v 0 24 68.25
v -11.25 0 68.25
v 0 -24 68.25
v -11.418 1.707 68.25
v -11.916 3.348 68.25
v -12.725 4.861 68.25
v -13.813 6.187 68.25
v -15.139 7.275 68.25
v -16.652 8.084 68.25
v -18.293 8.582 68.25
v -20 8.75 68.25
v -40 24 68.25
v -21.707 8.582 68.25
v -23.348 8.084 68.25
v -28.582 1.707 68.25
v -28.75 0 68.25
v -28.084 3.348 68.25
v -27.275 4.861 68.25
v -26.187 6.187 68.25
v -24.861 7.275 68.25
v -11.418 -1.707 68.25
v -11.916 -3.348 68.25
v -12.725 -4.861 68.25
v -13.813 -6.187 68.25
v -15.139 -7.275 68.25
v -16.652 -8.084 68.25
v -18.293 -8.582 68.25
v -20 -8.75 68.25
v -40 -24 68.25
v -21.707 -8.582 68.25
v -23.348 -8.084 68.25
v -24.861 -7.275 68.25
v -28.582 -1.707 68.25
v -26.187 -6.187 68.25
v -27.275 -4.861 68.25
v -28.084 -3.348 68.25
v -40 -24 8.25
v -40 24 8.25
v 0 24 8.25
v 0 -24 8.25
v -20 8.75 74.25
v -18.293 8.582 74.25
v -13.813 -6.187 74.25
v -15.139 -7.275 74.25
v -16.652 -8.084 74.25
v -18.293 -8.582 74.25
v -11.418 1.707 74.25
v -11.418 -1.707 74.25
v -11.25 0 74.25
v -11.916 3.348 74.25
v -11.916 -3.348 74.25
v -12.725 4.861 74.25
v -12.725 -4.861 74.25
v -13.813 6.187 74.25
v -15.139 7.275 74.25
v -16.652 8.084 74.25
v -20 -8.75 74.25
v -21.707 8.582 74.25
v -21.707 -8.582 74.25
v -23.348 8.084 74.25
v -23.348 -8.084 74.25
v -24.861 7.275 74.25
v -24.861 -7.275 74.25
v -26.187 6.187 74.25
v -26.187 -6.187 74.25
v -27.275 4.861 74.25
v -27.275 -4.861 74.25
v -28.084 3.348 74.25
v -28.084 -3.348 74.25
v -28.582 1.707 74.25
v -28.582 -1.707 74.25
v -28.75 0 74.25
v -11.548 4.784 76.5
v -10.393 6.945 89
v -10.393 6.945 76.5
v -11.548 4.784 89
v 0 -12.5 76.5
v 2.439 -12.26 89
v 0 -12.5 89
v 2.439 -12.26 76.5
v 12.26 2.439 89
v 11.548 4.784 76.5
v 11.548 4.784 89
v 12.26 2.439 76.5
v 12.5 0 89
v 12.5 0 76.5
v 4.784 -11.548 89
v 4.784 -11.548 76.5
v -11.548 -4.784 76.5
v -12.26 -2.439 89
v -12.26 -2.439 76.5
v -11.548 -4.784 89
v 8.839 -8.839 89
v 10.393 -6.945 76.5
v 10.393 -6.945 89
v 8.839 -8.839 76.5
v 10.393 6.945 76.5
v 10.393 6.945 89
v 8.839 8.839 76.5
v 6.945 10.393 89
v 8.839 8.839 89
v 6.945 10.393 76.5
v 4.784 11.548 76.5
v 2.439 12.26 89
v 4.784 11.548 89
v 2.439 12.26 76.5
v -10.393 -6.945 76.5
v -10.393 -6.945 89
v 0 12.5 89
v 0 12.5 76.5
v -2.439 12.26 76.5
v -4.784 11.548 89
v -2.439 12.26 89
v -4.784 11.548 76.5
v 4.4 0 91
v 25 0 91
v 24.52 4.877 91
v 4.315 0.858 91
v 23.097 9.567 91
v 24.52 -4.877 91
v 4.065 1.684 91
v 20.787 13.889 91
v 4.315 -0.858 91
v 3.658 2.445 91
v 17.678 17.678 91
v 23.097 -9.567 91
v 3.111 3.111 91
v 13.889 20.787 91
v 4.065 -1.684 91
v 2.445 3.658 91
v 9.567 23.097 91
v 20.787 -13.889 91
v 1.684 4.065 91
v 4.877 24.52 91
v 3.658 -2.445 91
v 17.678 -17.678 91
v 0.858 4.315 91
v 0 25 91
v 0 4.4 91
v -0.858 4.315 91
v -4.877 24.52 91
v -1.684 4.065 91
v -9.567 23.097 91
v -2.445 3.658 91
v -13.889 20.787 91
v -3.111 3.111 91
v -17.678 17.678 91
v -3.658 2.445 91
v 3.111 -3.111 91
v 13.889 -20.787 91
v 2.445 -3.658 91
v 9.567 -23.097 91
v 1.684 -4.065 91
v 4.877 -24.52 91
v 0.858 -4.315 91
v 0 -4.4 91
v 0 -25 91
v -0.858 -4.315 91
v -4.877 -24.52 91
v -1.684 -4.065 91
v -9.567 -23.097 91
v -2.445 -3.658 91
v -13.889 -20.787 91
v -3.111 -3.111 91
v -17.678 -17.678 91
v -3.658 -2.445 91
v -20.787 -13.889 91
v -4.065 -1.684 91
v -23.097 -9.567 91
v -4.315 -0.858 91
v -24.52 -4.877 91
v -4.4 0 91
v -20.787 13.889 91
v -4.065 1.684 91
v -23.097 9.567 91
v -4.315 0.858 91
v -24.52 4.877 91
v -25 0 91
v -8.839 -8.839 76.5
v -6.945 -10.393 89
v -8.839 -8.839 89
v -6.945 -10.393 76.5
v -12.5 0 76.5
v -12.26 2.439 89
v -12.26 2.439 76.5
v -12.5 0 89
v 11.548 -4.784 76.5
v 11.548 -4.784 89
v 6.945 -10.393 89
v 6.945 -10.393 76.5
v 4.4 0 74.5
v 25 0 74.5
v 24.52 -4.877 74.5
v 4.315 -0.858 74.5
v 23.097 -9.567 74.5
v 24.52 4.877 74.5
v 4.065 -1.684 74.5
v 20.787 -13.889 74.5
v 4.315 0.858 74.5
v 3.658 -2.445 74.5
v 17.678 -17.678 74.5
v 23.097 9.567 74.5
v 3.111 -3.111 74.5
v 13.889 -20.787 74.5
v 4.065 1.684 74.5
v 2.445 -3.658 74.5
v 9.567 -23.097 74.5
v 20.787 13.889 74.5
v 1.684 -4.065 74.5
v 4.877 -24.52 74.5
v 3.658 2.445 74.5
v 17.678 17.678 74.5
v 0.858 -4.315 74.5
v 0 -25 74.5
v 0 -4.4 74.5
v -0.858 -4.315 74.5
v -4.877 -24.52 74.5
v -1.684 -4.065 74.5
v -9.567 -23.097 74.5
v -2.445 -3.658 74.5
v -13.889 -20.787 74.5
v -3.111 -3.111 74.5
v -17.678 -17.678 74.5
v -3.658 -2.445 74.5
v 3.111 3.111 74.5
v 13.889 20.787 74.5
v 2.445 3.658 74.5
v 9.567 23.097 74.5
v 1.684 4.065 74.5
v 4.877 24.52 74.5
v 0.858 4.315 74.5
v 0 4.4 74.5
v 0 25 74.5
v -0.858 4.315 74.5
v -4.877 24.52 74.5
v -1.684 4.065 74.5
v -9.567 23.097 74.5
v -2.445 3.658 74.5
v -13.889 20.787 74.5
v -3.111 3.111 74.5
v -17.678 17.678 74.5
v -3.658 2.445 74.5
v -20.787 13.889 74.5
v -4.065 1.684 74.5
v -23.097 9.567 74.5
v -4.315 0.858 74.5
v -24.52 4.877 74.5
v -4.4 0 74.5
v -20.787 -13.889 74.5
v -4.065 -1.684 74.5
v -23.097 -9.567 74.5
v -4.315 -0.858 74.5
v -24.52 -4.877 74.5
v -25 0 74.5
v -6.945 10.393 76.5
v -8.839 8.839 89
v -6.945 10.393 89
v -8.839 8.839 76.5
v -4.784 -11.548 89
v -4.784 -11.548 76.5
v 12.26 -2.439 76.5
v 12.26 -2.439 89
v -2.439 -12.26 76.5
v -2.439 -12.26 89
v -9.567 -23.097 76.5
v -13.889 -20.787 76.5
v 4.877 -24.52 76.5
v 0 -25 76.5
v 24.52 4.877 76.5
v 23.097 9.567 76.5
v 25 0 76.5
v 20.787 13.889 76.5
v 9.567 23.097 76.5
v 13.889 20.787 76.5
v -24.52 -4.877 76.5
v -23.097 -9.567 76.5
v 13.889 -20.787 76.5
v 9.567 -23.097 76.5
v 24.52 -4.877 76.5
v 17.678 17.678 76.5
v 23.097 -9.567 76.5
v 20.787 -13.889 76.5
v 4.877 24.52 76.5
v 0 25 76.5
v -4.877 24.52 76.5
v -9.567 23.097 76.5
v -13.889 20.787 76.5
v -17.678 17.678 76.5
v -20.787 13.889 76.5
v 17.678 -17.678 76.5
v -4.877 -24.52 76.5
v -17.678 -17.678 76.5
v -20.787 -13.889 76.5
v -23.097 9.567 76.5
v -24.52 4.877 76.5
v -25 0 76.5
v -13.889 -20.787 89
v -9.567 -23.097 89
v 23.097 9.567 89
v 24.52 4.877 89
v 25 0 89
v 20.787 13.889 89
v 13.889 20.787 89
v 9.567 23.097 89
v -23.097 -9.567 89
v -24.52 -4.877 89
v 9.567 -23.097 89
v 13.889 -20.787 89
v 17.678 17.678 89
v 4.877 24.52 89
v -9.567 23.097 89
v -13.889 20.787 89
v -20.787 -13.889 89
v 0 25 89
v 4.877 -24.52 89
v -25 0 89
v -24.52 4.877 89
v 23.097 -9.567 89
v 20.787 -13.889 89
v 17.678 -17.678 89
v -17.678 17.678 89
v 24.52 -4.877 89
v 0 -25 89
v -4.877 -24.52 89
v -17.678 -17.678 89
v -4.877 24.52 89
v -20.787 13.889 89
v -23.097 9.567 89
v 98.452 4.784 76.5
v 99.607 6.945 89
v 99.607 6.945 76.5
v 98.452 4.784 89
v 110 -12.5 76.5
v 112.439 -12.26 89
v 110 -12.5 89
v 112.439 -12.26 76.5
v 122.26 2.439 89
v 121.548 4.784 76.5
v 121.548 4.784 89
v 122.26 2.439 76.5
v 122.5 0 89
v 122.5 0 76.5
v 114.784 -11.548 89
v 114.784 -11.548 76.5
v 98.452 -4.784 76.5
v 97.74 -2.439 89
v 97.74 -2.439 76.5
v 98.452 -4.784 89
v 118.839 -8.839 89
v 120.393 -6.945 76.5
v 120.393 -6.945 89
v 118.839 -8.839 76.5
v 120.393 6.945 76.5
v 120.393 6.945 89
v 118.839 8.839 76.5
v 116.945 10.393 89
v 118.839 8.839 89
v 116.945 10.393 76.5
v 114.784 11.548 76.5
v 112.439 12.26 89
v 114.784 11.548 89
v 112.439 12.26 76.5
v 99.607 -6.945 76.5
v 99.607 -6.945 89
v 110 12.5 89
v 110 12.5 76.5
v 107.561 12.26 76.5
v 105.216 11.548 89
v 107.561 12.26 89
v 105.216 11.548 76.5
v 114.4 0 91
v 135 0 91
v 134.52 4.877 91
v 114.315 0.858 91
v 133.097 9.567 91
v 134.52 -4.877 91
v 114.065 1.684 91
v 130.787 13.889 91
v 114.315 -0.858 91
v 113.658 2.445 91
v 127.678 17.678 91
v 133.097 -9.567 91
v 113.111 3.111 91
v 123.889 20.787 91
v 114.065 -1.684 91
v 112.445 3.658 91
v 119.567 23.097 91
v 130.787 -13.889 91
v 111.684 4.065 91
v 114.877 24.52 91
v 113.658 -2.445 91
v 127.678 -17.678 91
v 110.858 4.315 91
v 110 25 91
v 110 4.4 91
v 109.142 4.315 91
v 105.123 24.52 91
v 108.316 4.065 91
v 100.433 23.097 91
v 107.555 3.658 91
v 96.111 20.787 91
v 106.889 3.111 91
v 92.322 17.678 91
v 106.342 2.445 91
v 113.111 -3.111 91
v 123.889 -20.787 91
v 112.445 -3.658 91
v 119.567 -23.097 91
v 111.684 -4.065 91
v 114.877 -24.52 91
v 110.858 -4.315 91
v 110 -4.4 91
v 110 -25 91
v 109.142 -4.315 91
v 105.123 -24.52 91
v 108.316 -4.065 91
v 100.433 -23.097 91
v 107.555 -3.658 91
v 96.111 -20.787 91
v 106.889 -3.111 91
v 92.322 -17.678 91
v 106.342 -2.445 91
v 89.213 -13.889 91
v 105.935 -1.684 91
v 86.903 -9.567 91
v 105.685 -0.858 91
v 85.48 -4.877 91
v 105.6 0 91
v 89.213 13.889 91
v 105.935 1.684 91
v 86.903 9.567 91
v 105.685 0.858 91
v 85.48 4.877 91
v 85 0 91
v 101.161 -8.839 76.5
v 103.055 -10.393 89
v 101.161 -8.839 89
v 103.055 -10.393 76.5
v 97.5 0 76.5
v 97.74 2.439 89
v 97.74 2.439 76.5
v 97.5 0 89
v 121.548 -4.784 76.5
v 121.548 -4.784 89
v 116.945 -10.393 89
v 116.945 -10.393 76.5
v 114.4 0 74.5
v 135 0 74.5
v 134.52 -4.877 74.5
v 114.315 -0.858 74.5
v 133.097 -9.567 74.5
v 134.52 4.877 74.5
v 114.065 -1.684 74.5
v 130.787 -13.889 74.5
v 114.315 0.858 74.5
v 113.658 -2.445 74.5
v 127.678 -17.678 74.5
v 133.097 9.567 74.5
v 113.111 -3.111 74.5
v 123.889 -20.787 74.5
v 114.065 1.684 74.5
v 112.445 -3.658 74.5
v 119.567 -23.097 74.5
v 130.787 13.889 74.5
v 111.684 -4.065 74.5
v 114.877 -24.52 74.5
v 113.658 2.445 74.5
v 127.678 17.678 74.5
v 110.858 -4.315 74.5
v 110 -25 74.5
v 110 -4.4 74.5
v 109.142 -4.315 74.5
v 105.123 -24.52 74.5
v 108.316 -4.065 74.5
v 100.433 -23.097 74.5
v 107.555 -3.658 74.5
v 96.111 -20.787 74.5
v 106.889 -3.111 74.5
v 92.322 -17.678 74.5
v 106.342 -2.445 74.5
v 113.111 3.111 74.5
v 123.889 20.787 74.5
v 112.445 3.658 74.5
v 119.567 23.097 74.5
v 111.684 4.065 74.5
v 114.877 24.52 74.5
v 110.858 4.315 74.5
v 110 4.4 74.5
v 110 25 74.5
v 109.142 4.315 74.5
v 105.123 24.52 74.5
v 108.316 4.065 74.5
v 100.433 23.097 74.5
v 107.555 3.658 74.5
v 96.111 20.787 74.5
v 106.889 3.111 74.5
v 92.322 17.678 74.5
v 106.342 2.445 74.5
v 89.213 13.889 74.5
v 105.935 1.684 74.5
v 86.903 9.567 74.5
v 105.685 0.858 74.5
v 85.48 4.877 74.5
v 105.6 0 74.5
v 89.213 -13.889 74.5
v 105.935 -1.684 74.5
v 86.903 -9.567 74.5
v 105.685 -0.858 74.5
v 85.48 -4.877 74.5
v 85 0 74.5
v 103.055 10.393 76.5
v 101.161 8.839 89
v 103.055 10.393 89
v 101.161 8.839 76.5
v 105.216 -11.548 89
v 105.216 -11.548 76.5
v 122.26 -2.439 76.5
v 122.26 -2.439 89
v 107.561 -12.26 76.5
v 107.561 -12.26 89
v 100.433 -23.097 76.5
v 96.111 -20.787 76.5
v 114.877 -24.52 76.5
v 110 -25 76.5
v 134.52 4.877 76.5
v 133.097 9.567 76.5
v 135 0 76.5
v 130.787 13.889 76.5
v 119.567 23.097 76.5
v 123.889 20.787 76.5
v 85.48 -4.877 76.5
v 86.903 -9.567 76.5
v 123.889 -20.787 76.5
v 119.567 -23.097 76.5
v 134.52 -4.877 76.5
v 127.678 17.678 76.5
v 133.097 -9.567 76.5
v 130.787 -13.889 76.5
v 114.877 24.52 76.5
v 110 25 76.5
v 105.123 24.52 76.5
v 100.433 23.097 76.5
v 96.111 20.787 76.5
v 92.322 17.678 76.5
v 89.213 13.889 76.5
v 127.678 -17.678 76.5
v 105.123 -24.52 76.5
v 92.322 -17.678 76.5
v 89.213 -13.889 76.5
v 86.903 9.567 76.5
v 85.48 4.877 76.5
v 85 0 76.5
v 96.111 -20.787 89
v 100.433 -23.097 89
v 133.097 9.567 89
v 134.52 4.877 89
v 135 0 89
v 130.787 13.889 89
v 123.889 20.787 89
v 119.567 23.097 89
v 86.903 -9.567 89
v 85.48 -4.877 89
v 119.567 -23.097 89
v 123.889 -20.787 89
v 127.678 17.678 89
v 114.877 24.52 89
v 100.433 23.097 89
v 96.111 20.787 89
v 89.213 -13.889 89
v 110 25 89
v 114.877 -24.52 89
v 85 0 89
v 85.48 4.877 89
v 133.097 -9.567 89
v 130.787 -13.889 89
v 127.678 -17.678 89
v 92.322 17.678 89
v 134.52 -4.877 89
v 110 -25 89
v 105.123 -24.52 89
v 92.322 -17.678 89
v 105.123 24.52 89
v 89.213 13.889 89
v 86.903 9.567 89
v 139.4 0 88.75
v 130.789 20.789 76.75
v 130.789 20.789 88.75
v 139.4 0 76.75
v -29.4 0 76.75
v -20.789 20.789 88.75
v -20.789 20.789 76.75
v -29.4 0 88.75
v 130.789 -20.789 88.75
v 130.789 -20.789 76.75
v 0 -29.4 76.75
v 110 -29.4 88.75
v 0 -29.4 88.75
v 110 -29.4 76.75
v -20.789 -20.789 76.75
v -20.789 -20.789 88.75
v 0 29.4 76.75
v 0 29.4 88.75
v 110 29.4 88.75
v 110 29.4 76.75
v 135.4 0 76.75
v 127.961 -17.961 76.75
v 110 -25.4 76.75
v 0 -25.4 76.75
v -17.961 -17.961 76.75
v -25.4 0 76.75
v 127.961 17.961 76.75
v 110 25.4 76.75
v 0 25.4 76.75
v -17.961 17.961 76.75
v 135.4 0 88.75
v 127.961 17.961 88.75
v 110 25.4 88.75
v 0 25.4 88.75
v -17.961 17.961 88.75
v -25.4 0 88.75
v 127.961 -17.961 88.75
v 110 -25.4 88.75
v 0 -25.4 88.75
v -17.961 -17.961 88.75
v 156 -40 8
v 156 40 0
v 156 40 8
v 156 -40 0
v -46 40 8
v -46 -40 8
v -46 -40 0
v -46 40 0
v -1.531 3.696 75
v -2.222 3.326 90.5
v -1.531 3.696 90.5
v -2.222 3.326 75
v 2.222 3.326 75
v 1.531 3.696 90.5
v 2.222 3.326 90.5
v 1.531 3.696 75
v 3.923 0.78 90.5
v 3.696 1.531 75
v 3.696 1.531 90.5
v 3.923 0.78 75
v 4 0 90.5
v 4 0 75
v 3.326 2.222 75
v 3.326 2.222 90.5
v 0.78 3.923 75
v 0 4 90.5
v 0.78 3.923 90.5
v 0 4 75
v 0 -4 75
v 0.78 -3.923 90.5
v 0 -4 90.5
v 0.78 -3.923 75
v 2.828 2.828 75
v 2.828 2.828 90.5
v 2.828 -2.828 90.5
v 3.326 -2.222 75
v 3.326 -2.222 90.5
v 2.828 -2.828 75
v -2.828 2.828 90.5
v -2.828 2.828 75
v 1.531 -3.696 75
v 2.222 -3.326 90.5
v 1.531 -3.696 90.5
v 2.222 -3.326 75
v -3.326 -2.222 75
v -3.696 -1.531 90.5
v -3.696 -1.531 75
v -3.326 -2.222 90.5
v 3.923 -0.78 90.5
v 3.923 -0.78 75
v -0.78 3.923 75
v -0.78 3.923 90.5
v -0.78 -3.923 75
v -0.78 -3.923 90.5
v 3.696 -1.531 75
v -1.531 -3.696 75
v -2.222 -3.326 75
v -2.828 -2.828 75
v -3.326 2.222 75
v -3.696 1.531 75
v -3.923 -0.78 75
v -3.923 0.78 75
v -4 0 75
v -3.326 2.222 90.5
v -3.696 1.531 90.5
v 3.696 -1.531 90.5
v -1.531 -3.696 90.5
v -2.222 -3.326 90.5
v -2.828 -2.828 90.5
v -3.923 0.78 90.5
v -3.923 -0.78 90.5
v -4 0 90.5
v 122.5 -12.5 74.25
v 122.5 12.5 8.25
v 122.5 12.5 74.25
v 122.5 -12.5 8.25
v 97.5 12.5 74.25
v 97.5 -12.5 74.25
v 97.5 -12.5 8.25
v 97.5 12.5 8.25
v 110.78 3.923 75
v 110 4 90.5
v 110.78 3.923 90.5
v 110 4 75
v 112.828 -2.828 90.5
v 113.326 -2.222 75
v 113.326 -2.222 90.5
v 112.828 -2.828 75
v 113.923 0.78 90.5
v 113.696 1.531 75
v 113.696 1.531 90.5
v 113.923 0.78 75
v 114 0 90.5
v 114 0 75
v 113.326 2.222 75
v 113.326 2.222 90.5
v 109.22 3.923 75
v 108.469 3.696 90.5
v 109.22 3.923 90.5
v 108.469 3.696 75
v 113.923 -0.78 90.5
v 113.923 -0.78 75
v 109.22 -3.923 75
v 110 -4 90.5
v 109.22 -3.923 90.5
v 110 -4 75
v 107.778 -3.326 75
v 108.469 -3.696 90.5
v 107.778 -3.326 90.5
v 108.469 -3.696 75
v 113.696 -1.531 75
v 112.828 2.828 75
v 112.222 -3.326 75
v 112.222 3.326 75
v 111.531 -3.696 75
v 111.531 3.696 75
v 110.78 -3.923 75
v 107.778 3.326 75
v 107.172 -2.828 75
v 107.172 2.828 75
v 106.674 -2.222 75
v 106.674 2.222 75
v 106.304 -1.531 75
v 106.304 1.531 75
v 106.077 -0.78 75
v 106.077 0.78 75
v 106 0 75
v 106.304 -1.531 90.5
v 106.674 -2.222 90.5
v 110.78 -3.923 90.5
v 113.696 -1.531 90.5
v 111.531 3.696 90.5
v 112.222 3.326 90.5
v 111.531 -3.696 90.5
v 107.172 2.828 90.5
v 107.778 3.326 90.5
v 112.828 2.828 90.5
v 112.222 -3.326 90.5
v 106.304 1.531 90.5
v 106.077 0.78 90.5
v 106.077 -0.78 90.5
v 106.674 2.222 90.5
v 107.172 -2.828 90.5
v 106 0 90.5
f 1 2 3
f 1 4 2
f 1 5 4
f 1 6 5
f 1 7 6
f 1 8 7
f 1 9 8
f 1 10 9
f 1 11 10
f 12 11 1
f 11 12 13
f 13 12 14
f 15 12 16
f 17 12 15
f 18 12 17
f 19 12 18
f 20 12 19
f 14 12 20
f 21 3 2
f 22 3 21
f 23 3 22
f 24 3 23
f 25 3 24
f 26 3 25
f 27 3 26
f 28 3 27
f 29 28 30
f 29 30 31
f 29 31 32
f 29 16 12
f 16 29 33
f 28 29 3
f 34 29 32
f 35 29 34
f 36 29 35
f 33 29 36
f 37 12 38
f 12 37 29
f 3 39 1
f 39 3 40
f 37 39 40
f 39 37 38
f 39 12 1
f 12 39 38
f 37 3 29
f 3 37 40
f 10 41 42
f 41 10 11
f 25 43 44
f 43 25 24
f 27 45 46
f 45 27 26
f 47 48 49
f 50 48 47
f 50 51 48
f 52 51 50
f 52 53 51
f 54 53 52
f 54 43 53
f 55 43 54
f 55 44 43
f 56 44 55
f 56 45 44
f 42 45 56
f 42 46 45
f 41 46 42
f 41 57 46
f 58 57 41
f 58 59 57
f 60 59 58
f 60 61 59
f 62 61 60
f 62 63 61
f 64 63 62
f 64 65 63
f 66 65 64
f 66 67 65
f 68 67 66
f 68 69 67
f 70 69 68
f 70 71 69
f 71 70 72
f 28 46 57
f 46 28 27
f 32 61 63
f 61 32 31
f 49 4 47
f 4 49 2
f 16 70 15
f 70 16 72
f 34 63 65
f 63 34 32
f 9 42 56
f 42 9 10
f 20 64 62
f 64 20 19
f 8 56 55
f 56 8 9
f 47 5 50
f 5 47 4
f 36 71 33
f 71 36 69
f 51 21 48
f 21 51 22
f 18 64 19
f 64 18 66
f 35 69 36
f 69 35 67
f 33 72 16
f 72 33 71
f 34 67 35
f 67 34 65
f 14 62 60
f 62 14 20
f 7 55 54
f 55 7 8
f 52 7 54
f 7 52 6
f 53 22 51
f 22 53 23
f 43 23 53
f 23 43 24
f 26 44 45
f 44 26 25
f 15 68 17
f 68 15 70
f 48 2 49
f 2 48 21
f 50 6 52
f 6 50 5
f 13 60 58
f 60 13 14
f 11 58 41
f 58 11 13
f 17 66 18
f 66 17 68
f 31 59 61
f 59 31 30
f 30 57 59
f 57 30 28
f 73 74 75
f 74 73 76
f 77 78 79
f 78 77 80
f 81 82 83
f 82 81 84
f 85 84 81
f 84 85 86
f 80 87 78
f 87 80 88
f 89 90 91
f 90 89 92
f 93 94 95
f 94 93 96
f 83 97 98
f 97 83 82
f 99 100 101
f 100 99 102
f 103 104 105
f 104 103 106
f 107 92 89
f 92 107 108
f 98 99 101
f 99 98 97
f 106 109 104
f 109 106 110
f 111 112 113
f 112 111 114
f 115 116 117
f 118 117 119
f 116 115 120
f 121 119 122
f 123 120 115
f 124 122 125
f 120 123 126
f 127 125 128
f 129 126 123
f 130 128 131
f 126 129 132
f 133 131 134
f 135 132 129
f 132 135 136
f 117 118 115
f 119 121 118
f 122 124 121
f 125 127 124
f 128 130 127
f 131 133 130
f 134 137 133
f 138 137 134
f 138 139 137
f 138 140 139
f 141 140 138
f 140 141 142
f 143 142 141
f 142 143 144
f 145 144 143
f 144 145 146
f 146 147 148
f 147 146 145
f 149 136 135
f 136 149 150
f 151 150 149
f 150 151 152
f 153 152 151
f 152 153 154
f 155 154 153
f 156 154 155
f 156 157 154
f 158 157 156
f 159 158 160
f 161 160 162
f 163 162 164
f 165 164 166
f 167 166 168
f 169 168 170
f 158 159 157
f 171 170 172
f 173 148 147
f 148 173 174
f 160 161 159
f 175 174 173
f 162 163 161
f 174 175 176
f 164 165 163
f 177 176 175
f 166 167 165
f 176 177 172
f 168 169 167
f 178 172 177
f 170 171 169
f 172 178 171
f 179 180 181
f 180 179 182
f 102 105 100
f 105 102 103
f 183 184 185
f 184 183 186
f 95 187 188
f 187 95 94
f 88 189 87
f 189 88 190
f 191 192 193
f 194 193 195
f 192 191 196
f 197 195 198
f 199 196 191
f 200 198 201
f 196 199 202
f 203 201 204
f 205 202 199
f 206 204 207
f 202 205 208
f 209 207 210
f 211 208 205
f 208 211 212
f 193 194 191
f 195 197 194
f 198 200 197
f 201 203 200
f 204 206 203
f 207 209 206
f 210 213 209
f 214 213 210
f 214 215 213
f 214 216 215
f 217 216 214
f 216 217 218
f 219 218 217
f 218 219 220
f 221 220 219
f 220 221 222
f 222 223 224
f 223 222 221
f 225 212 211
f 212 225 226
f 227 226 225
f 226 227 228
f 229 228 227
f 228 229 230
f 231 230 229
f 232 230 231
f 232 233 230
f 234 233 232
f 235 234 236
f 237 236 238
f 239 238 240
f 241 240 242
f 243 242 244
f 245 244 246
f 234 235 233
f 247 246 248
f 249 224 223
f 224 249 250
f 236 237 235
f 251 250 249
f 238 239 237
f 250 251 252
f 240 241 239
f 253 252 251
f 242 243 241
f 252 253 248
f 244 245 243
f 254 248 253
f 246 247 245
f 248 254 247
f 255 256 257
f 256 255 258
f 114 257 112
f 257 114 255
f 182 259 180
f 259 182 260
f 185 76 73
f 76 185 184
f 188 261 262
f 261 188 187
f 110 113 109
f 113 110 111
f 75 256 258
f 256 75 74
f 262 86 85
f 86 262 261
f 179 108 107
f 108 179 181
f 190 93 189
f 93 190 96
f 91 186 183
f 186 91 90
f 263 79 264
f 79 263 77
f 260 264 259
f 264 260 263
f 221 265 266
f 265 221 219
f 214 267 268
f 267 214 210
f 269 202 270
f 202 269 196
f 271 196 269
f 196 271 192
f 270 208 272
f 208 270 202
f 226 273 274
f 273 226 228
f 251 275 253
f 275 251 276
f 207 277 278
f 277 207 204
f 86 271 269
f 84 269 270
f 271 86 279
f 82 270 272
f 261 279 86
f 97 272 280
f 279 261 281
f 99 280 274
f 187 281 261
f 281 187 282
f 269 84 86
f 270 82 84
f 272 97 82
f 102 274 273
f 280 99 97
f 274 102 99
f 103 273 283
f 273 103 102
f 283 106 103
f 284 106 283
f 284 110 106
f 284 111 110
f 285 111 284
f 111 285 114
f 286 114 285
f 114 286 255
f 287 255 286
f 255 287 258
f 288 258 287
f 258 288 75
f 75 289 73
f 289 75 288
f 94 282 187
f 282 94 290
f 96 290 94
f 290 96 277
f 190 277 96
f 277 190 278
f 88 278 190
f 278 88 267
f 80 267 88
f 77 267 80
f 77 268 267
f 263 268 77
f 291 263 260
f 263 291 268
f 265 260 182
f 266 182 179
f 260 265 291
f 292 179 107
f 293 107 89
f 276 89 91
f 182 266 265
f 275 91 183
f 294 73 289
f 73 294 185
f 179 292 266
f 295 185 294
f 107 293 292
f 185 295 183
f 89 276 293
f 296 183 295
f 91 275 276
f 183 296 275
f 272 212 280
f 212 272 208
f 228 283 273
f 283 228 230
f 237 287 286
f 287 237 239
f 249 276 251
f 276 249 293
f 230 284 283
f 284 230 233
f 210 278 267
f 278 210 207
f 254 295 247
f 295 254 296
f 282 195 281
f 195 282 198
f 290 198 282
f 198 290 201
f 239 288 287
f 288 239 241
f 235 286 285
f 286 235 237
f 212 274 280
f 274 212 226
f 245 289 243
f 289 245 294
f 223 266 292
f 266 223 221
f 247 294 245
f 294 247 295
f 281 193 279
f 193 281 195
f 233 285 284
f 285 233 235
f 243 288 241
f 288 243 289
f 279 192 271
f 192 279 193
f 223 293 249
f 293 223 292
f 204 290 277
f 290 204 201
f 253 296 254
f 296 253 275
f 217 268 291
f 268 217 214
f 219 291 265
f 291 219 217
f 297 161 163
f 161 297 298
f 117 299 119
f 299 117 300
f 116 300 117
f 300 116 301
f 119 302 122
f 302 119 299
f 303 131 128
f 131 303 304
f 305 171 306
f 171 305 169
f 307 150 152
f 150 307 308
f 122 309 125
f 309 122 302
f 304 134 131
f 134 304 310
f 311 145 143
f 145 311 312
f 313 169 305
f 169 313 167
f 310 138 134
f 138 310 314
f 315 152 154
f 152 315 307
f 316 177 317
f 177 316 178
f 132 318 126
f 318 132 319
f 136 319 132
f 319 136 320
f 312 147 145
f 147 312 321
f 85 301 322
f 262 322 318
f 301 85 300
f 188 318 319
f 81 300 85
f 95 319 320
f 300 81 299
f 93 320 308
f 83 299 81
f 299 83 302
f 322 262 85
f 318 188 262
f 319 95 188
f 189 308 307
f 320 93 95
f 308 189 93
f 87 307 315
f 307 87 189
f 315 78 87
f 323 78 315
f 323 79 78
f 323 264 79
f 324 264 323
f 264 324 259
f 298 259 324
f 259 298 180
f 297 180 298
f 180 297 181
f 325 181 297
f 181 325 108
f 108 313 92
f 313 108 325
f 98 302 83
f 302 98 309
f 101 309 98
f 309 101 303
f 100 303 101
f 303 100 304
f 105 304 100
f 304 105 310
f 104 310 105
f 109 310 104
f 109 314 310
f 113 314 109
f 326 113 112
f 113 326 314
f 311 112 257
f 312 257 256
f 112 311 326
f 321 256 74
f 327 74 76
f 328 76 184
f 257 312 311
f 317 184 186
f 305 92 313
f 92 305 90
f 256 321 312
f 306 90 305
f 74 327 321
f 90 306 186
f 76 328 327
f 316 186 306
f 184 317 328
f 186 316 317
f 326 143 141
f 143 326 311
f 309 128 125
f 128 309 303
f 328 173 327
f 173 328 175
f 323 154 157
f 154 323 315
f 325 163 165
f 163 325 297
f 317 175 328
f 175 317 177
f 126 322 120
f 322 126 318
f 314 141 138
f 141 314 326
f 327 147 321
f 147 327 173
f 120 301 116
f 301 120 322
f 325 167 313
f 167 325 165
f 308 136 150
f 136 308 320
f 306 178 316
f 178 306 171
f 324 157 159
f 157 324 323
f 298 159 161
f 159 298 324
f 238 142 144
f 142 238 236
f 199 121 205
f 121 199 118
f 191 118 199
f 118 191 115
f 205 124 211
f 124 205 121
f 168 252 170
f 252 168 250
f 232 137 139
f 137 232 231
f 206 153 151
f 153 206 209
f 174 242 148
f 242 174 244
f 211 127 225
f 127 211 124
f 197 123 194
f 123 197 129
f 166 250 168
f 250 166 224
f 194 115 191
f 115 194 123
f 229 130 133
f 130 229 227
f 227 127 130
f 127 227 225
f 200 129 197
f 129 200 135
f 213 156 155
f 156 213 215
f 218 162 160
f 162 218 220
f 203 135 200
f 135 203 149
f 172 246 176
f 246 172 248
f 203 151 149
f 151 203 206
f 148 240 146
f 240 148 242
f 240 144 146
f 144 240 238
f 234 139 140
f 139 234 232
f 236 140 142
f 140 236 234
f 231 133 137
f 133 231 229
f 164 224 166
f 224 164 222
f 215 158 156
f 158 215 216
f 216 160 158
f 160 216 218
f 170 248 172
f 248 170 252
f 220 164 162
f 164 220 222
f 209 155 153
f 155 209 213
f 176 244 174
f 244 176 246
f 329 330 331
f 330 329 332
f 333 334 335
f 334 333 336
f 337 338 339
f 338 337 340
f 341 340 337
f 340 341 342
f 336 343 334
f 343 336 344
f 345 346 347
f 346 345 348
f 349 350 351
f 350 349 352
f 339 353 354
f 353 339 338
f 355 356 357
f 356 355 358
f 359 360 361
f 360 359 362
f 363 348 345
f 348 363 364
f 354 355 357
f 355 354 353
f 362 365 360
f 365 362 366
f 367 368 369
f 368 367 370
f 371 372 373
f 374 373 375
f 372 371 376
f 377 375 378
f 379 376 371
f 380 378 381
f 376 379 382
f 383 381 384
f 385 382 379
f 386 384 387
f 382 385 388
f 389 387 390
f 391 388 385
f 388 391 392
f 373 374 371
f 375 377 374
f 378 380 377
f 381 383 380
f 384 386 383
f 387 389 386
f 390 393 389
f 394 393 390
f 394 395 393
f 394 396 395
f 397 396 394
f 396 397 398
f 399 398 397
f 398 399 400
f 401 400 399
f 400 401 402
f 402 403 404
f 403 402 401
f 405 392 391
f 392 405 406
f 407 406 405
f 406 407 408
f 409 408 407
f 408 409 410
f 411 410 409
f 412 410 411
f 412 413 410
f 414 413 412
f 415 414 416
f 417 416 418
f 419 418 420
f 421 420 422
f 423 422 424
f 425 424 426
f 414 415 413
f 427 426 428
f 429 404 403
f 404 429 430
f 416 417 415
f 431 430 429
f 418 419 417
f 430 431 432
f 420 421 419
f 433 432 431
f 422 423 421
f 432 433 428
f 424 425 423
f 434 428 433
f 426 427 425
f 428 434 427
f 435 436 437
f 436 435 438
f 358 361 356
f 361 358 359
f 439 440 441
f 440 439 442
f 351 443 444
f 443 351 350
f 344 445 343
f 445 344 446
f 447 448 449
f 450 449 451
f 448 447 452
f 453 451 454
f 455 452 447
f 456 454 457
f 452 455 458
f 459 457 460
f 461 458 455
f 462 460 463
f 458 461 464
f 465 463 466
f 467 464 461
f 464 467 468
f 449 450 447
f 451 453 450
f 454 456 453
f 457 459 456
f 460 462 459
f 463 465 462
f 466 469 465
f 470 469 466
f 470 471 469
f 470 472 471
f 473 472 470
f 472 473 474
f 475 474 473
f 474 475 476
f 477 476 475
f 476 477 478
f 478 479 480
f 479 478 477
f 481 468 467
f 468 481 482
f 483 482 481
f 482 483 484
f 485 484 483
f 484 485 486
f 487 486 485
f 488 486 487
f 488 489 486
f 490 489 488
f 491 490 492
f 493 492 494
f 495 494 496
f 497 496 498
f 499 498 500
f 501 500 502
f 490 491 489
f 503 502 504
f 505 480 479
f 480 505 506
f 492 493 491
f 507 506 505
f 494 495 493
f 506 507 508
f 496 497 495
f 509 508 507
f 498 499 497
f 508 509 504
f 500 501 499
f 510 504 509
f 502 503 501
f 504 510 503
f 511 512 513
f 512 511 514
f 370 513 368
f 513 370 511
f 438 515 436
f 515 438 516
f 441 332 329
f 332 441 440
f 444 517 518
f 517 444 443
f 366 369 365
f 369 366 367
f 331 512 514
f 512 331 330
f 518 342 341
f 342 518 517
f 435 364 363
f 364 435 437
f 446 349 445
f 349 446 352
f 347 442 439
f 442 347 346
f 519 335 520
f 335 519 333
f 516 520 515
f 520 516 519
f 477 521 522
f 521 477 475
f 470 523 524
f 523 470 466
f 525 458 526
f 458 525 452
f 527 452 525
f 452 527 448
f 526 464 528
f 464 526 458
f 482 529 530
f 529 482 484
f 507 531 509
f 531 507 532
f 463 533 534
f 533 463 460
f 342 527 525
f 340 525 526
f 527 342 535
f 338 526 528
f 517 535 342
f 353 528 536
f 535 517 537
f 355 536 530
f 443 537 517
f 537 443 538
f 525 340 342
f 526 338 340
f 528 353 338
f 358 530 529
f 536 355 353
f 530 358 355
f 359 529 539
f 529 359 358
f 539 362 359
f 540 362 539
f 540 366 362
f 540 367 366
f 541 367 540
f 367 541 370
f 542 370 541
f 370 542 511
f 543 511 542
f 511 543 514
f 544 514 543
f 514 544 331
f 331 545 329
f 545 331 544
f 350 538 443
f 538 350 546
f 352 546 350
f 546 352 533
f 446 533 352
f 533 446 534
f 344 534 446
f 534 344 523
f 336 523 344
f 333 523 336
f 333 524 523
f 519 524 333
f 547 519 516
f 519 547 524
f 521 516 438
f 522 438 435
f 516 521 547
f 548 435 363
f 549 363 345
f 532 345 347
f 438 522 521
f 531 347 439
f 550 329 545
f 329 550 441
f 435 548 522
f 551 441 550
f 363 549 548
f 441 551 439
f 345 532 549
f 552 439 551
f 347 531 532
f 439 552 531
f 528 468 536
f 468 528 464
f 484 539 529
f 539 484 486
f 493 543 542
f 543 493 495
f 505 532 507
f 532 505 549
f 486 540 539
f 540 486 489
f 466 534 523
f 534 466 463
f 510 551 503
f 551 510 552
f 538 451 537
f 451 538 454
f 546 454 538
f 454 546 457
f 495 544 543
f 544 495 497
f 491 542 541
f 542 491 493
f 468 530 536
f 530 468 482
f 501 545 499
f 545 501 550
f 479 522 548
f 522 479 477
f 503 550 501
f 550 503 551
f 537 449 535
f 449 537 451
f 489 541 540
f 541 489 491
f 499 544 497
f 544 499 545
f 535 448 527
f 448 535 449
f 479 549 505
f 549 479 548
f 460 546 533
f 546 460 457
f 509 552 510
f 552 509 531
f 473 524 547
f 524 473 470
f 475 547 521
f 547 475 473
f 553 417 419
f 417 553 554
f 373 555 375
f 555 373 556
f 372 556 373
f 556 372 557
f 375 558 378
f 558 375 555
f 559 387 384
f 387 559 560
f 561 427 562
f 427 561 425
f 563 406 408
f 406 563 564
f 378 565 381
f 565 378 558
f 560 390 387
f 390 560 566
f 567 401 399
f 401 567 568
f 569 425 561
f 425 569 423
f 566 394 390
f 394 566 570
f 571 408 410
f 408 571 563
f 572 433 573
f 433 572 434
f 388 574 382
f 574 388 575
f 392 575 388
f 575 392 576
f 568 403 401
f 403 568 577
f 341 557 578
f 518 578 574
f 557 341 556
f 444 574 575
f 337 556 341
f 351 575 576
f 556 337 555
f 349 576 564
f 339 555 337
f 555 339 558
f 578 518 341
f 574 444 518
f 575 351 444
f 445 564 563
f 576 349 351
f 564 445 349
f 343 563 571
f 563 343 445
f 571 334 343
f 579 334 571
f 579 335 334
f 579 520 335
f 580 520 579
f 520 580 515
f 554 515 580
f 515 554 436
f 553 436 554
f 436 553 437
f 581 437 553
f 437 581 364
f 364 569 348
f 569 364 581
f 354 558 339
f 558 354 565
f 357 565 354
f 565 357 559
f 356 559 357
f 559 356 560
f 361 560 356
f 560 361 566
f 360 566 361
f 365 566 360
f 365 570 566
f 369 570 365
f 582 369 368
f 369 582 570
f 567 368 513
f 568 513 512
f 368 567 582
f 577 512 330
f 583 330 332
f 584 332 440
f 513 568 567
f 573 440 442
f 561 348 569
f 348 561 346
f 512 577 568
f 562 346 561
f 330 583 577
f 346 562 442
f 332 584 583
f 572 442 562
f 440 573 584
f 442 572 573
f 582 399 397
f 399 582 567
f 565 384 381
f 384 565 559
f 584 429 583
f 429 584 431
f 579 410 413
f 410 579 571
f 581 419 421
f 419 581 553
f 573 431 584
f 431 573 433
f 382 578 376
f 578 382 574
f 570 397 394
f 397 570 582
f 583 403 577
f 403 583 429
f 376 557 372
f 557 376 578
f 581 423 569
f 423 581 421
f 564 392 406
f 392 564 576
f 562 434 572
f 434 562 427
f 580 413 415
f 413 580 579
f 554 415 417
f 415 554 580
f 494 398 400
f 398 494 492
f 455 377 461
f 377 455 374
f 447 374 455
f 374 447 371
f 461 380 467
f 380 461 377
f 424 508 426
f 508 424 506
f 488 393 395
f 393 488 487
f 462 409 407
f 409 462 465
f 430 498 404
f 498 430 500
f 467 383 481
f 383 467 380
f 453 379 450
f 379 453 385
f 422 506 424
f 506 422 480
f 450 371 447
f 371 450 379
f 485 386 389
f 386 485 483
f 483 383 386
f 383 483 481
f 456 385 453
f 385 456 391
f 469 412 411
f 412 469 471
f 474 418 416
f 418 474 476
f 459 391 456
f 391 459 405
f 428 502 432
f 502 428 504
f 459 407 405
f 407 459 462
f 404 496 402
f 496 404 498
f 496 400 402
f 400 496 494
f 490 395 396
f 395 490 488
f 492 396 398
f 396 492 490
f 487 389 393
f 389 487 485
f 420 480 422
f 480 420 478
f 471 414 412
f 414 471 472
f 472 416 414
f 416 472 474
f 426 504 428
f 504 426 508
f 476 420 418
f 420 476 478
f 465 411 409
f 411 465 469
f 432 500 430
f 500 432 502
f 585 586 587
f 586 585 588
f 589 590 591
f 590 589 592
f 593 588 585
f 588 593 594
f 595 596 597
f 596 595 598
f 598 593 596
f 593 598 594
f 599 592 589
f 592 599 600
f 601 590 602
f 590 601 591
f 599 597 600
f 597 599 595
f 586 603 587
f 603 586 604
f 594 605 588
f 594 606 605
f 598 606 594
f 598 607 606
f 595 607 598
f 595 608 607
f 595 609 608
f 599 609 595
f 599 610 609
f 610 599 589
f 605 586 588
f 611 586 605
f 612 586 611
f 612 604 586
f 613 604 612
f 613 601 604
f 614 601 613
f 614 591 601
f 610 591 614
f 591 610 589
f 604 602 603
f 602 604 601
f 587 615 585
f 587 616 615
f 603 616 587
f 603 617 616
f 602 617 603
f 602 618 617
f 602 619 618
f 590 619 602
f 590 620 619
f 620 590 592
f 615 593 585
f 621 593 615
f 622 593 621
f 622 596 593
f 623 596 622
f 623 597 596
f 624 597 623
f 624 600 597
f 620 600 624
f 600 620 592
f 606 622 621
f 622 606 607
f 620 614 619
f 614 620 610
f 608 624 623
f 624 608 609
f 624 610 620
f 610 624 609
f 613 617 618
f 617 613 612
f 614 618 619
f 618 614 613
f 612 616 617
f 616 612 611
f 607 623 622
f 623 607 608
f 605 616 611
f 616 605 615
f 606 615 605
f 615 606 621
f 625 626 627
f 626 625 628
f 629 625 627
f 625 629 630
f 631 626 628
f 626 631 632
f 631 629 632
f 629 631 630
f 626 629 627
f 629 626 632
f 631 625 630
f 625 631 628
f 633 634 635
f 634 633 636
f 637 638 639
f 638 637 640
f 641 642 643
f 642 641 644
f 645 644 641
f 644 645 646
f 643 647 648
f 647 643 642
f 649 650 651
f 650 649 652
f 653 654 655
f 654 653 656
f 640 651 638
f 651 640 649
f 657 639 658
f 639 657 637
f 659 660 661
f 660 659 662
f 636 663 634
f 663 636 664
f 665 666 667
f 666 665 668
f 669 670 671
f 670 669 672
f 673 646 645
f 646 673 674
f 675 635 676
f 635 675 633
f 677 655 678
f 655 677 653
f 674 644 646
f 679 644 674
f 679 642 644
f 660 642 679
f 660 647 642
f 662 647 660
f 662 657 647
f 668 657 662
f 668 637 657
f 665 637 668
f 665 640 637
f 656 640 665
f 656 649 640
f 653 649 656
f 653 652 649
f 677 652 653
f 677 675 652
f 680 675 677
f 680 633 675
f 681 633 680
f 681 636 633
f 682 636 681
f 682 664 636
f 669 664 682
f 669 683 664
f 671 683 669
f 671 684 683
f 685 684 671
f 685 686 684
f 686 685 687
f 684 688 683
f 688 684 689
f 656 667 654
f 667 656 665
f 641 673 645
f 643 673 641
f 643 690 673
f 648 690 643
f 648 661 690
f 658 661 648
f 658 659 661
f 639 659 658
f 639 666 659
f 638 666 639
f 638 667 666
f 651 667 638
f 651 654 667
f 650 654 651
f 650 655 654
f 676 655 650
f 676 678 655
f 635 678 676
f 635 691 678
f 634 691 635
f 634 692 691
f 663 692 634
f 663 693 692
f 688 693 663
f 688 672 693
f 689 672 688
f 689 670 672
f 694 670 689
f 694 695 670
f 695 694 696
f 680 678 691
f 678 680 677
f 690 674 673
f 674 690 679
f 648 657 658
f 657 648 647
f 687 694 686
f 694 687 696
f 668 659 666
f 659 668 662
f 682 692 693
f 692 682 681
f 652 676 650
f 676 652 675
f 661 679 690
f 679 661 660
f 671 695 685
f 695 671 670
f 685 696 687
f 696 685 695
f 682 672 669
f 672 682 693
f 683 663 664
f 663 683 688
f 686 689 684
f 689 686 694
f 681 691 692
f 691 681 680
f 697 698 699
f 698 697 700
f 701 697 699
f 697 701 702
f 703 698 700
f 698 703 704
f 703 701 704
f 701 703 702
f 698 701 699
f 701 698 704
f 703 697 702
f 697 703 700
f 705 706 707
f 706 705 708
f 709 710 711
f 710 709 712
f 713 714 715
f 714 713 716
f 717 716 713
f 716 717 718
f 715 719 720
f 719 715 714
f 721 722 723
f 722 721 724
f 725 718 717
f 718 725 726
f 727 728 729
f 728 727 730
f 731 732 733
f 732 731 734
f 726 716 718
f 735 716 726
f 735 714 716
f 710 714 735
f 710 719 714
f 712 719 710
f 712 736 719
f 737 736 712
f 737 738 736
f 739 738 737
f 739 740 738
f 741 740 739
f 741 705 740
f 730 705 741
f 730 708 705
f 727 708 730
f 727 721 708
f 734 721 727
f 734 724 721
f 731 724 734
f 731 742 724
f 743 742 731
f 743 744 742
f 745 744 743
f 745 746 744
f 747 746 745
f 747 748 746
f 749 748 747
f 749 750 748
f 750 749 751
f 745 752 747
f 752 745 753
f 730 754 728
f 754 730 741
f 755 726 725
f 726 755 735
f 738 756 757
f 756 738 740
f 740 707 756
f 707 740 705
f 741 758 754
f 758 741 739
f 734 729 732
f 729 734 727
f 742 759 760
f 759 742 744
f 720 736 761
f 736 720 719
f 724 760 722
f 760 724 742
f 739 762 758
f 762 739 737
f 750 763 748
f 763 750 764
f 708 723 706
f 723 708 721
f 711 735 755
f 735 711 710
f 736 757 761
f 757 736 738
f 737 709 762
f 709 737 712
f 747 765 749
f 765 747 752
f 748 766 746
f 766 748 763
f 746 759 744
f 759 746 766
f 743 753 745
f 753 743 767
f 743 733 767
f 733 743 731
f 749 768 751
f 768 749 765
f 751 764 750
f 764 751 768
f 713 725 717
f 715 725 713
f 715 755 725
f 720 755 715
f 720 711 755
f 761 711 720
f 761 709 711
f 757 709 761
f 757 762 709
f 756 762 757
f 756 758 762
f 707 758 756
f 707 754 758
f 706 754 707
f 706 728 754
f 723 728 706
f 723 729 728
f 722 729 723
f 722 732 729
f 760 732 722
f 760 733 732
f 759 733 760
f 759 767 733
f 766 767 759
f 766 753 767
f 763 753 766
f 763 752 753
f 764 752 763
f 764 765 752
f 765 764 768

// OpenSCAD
$fn = 32;

// ------------------------------------------------------------------------
// Motor belt drive: span 110 mm, pulleys d50, belt 12 mm wide
// Every part is its own module, assembly() places every instance.
// ------------------------------------------------------------------------

// --- part 1 ---
module base_plate() {
  difference() {
    translate([-101, -40, 0]) cube([202, 80, 8]);
  }
}

// --- part 2 ---
module motor() {
  union() {
    translate([-30, -24, 0]) cube([60, 48, 40]);
    translate([33, 0, 20]) rotate([0, 90, 0]) cylinder(h = 6, d = 17.5, center = true);
  }
}

// --- part 3 ---
module drive_shaft() {
  translate([0, 0, -7.75]) cylinder(h = 15.5, d = 8);
}

// --- part 4 ---
module pulley_drive() {
  difference() {
    union() {
      cylinder(h = 16.5, d = 25);
      cylinder(h = 2, d = 50);
      translate([0, 0, 14.5]) cylinder(h = 2, d = 50);
    }
    translate([0, 0, -1]) cylinder(h = 18.5, d = 8.8);
  }
}

// --- part 5 ---
module idler_post() {
  translate([-12.5, -12.5, 0]) cube([25, 25, 66]);
}

// --- part 6 ---
module driven_shaft() {
  translate([0, 0, -7.75]) cylinder(h = 15.5, d = 8);
}

// --- part 7 ---
module pulley_driven() {
  difference() {
    union() {
      cylinder(h = 16.5, d = 25);
      cylinder(h = 2, d = 50);
      translate([0, 0, 14.5]) cylinder(h = 2, d = 50);
    }
    translate([0, 0, -1]) cylinder(h = 18.5, d = 8.8);
  }
}

// --- part 8 ---
module drive_belt() {
  difference() {
    linear_extrude(height = 12) polygon(points = concat([for (a = [90 : 45 : 270]) [29.4 * cos(a), 29.4 * sin(a)]], [for (a = [270 : 45 : 450]) [110 + 29.4 * cos(a), 29.4 * sin(a)]]));
    translate([0, 0, -1]) linear_extrude(height = 14) polygon(points = concat([for (a = [90 : 45 : 270]) [25.4 * cos(a), 25.4 * sin(a)]], [for (a = [270 : 45 : 450]) [110 + 25.4 * cos(a), 25.4 * sin(a)]]));
  }
}

// --- assembly ---
module assembly() {
  color([0.80, 0.24, 0.20]) translate([55, 0, 0]) rotate([0, 0, 0]) base_plate();
  color([0.20, 0.45, 0.75]) translate([0, 0, 38.25]) rotate([0, 270, 0]) motor();
  color([0.25, 0.62, 0.32]) translate([0, 0, 82.75]) rotate([0, 0, 0]) drive_shaft();
  color([0.92, 0.70, 0.18]) translate([0, 0, 74.5]) rotate([0, 0, 0]) pulley_drive();
  color([0.58, 0.35, 0.70]) translate([110, 0, 8.25]) rotate([0, 0, 0]) idler_post();
  color([0.16, 0.66, 0.66]) translate([110, 0, 82.75]) rotate([0, 0, 0]) driven_shaft();
  color([0.85, 0.48, 0.18]) translate([110, 0, 74.5]) rotate([0, 0, 0]) pulley_driven();
  color([0.55, 0.60, 0.65]) translate([0, 0, 76.75]) rotate([0, 0, 0]) drive_belt();
}

assembly();
